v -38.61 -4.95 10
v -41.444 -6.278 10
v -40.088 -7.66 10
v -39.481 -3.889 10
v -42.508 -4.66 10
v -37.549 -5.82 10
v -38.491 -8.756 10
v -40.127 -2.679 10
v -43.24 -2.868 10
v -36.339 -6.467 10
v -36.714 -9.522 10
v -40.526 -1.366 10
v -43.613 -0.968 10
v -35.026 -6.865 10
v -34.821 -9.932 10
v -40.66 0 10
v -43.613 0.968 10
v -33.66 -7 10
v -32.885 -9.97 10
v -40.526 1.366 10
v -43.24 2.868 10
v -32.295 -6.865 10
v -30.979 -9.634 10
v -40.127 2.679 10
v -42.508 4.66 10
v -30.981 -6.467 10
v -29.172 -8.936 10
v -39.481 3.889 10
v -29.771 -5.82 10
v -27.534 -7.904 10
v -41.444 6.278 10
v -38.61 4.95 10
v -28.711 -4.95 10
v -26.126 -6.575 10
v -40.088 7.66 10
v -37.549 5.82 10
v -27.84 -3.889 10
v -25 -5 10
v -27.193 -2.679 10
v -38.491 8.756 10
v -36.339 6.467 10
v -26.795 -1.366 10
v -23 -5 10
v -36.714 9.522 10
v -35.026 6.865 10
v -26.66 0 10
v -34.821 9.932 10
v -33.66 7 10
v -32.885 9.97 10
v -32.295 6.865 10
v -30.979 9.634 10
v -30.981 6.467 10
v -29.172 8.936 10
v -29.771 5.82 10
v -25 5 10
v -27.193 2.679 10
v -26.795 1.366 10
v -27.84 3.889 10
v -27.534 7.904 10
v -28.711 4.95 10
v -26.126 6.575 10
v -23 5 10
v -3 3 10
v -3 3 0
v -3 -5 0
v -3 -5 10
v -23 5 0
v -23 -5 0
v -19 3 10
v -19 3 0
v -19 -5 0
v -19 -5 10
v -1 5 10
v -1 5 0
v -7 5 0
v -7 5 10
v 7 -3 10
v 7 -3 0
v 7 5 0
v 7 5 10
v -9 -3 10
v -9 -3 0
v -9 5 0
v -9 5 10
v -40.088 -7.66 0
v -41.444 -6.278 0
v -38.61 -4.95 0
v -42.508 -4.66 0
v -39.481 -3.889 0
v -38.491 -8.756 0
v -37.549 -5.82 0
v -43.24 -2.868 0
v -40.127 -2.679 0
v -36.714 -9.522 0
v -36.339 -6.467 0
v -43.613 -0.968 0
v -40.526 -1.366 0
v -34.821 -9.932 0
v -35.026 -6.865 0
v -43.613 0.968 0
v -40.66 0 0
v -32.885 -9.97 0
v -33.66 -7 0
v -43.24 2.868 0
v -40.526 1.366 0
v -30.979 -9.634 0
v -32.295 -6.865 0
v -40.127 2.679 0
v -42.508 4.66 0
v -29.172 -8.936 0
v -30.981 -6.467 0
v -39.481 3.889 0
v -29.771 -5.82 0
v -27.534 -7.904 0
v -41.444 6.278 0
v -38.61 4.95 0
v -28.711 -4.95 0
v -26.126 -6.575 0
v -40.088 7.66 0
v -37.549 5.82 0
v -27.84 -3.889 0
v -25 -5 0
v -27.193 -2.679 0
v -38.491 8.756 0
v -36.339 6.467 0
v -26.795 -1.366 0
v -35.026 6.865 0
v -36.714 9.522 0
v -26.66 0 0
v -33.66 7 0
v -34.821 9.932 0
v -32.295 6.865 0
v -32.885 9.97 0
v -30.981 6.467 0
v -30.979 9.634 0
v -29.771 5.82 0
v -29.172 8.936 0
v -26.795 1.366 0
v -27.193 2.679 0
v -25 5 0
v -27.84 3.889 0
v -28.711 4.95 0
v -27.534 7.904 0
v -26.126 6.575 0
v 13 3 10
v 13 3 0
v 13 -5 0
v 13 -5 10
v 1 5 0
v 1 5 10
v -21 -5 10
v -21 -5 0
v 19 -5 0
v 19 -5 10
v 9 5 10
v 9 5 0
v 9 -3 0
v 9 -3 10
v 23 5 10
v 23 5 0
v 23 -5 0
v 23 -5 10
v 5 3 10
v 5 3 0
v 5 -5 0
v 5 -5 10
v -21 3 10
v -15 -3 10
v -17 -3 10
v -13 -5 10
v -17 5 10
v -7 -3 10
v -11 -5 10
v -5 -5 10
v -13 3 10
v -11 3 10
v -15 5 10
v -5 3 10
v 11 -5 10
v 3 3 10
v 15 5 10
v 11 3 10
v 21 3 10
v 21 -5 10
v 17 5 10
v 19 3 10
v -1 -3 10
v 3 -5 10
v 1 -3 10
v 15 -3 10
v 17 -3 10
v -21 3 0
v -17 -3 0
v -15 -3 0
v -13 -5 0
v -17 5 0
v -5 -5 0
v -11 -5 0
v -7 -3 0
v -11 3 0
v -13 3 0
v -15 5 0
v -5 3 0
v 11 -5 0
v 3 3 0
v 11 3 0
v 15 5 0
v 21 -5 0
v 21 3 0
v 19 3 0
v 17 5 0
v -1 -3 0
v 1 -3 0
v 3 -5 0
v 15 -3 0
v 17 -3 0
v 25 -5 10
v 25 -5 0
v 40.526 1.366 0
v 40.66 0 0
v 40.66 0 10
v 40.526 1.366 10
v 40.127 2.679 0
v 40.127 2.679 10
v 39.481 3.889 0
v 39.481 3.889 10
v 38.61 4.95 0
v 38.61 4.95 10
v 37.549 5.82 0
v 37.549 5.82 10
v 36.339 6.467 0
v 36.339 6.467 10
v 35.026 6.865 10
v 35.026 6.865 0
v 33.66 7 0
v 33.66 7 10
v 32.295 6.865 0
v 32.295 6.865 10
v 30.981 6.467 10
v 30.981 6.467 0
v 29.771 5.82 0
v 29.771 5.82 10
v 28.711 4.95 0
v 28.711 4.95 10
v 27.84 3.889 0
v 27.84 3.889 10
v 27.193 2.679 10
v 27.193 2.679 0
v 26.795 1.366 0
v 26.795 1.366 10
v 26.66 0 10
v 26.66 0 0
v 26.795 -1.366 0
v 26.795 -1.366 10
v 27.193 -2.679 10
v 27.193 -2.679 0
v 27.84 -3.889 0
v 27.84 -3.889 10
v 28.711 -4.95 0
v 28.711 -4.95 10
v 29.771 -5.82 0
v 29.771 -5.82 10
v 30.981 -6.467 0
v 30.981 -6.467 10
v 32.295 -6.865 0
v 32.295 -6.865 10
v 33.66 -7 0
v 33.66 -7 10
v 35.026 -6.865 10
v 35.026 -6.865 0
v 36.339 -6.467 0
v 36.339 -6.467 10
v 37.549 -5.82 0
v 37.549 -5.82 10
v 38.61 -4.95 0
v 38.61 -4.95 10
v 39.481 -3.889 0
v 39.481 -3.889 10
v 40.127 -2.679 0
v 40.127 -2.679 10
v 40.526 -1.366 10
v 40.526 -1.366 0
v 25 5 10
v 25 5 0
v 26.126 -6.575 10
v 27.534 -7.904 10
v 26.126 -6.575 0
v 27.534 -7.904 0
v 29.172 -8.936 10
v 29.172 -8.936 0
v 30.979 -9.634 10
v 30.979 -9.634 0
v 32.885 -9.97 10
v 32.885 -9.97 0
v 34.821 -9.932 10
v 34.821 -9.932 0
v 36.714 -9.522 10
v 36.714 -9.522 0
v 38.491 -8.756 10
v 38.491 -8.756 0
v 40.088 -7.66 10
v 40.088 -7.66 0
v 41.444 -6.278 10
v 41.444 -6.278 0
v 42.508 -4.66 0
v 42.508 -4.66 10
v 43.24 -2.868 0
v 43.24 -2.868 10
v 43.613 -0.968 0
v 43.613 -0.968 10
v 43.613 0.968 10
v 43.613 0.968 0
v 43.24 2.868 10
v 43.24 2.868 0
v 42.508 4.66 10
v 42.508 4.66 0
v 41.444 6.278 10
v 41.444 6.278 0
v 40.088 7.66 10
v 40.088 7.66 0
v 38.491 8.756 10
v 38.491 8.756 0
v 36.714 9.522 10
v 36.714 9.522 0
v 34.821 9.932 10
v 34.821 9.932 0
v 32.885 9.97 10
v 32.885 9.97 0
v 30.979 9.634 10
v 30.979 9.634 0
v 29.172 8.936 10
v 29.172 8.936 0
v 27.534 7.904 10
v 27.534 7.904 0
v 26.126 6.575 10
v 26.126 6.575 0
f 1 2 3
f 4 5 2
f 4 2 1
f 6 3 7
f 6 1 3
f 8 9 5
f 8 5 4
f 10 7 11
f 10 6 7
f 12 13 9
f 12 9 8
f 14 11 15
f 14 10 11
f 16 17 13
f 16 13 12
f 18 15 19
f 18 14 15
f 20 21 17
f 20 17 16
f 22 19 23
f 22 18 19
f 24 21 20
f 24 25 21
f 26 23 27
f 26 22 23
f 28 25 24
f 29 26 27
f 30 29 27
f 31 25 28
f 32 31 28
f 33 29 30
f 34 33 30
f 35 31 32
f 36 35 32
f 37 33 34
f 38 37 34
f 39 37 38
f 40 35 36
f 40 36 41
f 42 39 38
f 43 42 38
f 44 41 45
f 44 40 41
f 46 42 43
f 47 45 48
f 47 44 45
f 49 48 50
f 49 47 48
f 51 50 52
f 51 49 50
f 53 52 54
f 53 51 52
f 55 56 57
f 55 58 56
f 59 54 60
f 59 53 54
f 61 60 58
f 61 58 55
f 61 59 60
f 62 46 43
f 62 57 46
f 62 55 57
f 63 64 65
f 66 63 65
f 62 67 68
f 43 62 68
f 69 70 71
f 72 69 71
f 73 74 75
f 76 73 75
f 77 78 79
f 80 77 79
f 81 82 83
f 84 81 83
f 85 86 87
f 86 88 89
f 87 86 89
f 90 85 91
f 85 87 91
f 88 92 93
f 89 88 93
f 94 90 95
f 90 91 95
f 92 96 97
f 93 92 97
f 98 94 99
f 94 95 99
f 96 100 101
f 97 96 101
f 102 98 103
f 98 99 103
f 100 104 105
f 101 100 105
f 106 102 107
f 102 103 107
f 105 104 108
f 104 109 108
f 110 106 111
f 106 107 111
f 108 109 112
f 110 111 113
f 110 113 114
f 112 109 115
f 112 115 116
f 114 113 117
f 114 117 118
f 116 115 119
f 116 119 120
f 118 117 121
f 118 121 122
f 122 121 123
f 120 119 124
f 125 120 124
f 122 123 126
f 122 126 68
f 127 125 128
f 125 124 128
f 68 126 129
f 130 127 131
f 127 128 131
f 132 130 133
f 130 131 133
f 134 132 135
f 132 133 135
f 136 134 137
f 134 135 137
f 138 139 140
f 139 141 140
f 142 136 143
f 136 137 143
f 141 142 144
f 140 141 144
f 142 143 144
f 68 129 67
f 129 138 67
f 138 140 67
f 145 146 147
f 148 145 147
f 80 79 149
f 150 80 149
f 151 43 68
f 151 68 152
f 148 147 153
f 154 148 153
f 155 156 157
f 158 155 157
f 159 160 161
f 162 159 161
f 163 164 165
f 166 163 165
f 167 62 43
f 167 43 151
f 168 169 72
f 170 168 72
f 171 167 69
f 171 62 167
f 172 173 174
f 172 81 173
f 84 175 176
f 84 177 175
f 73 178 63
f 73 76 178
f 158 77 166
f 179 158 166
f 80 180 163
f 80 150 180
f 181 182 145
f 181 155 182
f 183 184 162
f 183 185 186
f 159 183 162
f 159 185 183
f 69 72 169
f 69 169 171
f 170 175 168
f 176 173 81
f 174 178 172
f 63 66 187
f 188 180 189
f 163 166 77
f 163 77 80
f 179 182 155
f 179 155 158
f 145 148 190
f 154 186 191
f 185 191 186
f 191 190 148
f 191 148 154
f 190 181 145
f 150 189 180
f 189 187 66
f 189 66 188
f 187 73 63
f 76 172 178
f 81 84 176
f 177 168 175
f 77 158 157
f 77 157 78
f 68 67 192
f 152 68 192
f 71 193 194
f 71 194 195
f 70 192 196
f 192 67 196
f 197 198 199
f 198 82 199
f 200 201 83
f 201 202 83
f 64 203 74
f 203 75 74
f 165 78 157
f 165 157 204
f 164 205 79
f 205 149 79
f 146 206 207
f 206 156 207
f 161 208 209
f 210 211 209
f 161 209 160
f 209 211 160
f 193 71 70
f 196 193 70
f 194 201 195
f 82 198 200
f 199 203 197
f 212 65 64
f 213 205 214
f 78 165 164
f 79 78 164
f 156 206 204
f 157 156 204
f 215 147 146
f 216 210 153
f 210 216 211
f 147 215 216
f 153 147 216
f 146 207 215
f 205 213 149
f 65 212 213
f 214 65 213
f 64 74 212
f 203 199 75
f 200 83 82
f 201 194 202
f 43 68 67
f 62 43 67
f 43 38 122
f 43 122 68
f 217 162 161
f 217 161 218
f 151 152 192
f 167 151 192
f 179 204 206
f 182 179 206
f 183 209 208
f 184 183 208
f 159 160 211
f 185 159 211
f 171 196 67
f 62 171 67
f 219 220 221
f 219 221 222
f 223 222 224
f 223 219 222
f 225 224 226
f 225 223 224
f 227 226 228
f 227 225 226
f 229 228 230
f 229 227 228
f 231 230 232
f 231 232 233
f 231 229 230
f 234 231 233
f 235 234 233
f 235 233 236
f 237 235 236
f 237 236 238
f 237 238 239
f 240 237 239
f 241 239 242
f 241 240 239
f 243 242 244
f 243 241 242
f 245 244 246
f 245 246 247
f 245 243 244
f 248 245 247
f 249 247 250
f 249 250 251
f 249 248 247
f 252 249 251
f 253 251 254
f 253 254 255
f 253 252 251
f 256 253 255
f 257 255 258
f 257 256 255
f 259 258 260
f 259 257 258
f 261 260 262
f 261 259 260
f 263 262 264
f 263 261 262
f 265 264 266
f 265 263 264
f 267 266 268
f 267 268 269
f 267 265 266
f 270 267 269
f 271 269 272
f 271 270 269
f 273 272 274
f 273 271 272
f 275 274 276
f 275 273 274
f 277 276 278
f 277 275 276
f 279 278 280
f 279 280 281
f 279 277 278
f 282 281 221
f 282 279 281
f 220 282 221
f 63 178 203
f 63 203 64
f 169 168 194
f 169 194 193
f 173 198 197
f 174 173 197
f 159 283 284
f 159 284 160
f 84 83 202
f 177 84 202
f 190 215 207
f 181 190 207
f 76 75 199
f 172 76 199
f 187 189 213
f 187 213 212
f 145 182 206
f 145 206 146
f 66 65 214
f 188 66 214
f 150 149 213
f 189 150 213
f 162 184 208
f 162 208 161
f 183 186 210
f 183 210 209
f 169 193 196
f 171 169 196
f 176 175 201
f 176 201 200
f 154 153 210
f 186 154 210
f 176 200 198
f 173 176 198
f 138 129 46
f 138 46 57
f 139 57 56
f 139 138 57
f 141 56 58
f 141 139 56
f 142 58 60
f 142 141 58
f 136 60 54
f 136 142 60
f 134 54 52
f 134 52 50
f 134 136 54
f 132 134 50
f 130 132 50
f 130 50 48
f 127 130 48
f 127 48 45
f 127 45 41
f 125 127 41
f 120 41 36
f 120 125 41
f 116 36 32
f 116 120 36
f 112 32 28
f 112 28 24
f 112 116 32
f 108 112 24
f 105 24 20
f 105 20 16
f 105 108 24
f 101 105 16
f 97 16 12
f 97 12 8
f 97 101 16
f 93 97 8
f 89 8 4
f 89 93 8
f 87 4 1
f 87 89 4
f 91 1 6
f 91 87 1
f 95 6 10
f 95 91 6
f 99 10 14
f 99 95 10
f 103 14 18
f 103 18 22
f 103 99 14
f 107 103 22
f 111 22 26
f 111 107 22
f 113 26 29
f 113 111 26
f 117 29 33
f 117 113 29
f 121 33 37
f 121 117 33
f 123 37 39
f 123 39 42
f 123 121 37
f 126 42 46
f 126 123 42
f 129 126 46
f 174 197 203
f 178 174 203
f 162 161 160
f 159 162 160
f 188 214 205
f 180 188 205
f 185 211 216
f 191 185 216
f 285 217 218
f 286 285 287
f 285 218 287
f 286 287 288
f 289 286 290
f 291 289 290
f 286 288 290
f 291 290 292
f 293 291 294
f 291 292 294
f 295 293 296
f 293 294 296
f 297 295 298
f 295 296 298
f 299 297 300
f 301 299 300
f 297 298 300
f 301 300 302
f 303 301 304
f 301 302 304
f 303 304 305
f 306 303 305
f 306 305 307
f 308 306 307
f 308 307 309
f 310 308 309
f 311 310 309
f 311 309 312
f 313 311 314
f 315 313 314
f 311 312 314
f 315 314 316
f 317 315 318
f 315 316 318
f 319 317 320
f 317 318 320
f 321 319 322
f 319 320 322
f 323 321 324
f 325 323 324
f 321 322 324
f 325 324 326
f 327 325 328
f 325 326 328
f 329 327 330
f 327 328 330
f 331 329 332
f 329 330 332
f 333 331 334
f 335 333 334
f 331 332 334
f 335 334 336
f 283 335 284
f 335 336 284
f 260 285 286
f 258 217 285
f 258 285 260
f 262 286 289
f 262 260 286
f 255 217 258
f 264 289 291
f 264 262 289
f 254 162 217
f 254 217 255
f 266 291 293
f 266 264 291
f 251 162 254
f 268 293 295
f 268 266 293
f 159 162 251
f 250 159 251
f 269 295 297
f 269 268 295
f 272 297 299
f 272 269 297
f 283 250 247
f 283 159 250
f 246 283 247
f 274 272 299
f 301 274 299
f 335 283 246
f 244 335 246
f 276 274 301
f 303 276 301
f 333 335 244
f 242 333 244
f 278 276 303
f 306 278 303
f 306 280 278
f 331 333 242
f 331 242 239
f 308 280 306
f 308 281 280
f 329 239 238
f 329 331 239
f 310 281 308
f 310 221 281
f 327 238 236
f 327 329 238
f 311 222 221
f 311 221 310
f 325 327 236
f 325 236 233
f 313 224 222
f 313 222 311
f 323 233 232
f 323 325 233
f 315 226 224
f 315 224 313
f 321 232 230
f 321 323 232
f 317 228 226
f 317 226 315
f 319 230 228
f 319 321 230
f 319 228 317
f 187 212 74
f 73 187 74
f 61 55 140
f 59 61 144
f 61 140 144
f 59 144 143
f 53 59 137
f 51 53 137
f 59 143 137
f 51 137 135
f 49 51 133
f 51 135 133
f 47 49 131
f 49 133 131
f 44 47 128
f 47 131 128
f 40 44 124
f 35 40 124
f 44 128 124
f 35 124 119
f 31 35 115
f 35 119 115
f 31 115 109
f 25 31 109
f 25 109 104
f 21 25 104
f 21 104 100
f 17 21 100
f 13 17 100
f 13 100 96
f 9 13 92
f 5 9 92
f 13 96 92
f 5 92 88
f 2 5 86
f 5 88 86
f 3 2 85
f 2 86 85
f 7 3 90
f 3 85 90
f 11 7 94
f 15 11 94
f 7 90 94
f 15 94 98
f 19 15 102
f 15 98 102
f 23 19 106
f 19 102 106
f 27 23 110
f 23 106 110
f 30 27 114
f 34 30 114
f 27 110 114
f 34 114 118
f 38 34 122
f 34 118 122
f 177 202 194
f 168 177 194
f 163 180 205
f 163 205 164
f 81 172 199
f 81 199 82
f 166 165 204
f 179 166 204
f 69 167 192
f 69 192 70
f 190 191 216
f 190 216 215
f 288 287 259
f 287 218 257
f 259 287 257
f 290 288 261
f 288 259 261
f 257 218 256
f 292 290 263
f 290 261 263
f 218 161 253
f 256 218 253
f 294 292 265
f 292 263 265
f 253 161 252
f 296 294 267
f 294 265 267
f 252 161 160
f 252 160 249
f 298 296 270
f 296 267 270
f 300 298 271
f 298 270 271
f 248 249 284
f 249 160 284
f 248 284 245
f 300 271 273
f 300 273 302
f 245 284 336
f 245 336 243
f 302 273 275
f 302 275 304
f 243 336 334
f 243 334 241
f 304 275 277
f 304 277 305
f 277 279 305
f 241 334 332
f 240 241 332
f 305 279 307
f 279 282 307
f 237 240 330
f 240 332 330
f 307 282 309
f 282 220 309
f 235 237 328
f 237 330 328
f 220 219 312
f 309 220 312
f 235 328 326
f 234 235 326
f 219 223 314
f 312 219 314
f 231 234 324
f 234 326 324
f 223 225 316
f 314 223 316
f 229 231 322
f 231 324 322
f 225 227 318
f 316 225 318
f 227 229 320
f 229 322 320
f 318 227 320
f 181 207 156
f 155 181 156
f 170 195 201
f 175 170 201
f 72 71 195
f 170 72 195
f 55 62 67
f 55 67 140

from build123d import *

# Parameters (mm, degrees)
SKETCH1_R             = 7
BOSS_EXTRUDE1_DEPTH   = 10
BOSS_EXTRUDE1_2_DEPTH = 10
BOSS_EXTRUDE2_DEPTH   = 10


with BuildPart() as part:
    # Sketch1 → Boss-Extrude1 (new body)
    with BuildSketch(Plane.XY):
        with BuildLine():
            Line((-23, 5), (-25, 5))
            ThreePointArc((-25, 5), (-43.660254038, 0), (-25, -5))
            Line((-25, -5), (-23, -5))
            Line((-23, -5), (-23, 5))
        make_face()
        with Locations((-33.660254038, 0)):
            Circle(SKETCH1_R, mode=Mode.SUBTRACT)
    extrude(amount=BOSS_EXTRUDE1_DEPTH)


with BuildPart() as body_2:
    # Sketch1 → Boss-Extrude1 2 (new body)
    with BuildSketch(Plane.XY):
        with BuildLine():
            Line((25, 5), (23, 5))
            Line((23, 5), (23, -5))
            Line((23, -5), (25, -5))
            ThreePointArc((25, -5), (43.660254038, 0), (25, 5))
        make_face()
        with Locations((33.660254038, 0)):
            Circle(SKETCH1_R, mode=Mode.SUBTRACT)
    extrude(amount=BOSS_EXTRUDE1_2_DEPTH)


with BuildPart() as body_3:
    # Sketch1_3 → Boss-Extrude2 (new body)
    with BuildSketch(Plane.XY):
        Polygon((-17, 5), (-23, 5), (-23, -5), (-21, -5), (-21, 3), (-19, 3), (-19, -5), (-13, -5), (-13, 3), (-11, 3), (-11, -5), (-5, -5), (-5, 3), (-3, 3), (-3, -5), (3, -5), (3, 3), (5, 3), (5, -5), (11, -5), (11, 3), (13, 3), (13, -5), (19, -5), (19, 3), (21, 3), (21, -5), (23, -5), (23, -3), (23, 5), (17, 5), (17, -3), (15, -3), (15, 5), (9, 5), (9, -3), (7, -3), (7, 5), (1, 5), (1, -3), (-1, -3), (-1, 5), (-7, 5), (-7, -3), (-9, -3), (-9, 5), (-15, 5), (-15, -3), (-17, -3), align=None)
    extrude(amount=BOSS_EXTRUDE2_DEPTH)


solid = Compound([part.part, body_2.part, body_3.part])
